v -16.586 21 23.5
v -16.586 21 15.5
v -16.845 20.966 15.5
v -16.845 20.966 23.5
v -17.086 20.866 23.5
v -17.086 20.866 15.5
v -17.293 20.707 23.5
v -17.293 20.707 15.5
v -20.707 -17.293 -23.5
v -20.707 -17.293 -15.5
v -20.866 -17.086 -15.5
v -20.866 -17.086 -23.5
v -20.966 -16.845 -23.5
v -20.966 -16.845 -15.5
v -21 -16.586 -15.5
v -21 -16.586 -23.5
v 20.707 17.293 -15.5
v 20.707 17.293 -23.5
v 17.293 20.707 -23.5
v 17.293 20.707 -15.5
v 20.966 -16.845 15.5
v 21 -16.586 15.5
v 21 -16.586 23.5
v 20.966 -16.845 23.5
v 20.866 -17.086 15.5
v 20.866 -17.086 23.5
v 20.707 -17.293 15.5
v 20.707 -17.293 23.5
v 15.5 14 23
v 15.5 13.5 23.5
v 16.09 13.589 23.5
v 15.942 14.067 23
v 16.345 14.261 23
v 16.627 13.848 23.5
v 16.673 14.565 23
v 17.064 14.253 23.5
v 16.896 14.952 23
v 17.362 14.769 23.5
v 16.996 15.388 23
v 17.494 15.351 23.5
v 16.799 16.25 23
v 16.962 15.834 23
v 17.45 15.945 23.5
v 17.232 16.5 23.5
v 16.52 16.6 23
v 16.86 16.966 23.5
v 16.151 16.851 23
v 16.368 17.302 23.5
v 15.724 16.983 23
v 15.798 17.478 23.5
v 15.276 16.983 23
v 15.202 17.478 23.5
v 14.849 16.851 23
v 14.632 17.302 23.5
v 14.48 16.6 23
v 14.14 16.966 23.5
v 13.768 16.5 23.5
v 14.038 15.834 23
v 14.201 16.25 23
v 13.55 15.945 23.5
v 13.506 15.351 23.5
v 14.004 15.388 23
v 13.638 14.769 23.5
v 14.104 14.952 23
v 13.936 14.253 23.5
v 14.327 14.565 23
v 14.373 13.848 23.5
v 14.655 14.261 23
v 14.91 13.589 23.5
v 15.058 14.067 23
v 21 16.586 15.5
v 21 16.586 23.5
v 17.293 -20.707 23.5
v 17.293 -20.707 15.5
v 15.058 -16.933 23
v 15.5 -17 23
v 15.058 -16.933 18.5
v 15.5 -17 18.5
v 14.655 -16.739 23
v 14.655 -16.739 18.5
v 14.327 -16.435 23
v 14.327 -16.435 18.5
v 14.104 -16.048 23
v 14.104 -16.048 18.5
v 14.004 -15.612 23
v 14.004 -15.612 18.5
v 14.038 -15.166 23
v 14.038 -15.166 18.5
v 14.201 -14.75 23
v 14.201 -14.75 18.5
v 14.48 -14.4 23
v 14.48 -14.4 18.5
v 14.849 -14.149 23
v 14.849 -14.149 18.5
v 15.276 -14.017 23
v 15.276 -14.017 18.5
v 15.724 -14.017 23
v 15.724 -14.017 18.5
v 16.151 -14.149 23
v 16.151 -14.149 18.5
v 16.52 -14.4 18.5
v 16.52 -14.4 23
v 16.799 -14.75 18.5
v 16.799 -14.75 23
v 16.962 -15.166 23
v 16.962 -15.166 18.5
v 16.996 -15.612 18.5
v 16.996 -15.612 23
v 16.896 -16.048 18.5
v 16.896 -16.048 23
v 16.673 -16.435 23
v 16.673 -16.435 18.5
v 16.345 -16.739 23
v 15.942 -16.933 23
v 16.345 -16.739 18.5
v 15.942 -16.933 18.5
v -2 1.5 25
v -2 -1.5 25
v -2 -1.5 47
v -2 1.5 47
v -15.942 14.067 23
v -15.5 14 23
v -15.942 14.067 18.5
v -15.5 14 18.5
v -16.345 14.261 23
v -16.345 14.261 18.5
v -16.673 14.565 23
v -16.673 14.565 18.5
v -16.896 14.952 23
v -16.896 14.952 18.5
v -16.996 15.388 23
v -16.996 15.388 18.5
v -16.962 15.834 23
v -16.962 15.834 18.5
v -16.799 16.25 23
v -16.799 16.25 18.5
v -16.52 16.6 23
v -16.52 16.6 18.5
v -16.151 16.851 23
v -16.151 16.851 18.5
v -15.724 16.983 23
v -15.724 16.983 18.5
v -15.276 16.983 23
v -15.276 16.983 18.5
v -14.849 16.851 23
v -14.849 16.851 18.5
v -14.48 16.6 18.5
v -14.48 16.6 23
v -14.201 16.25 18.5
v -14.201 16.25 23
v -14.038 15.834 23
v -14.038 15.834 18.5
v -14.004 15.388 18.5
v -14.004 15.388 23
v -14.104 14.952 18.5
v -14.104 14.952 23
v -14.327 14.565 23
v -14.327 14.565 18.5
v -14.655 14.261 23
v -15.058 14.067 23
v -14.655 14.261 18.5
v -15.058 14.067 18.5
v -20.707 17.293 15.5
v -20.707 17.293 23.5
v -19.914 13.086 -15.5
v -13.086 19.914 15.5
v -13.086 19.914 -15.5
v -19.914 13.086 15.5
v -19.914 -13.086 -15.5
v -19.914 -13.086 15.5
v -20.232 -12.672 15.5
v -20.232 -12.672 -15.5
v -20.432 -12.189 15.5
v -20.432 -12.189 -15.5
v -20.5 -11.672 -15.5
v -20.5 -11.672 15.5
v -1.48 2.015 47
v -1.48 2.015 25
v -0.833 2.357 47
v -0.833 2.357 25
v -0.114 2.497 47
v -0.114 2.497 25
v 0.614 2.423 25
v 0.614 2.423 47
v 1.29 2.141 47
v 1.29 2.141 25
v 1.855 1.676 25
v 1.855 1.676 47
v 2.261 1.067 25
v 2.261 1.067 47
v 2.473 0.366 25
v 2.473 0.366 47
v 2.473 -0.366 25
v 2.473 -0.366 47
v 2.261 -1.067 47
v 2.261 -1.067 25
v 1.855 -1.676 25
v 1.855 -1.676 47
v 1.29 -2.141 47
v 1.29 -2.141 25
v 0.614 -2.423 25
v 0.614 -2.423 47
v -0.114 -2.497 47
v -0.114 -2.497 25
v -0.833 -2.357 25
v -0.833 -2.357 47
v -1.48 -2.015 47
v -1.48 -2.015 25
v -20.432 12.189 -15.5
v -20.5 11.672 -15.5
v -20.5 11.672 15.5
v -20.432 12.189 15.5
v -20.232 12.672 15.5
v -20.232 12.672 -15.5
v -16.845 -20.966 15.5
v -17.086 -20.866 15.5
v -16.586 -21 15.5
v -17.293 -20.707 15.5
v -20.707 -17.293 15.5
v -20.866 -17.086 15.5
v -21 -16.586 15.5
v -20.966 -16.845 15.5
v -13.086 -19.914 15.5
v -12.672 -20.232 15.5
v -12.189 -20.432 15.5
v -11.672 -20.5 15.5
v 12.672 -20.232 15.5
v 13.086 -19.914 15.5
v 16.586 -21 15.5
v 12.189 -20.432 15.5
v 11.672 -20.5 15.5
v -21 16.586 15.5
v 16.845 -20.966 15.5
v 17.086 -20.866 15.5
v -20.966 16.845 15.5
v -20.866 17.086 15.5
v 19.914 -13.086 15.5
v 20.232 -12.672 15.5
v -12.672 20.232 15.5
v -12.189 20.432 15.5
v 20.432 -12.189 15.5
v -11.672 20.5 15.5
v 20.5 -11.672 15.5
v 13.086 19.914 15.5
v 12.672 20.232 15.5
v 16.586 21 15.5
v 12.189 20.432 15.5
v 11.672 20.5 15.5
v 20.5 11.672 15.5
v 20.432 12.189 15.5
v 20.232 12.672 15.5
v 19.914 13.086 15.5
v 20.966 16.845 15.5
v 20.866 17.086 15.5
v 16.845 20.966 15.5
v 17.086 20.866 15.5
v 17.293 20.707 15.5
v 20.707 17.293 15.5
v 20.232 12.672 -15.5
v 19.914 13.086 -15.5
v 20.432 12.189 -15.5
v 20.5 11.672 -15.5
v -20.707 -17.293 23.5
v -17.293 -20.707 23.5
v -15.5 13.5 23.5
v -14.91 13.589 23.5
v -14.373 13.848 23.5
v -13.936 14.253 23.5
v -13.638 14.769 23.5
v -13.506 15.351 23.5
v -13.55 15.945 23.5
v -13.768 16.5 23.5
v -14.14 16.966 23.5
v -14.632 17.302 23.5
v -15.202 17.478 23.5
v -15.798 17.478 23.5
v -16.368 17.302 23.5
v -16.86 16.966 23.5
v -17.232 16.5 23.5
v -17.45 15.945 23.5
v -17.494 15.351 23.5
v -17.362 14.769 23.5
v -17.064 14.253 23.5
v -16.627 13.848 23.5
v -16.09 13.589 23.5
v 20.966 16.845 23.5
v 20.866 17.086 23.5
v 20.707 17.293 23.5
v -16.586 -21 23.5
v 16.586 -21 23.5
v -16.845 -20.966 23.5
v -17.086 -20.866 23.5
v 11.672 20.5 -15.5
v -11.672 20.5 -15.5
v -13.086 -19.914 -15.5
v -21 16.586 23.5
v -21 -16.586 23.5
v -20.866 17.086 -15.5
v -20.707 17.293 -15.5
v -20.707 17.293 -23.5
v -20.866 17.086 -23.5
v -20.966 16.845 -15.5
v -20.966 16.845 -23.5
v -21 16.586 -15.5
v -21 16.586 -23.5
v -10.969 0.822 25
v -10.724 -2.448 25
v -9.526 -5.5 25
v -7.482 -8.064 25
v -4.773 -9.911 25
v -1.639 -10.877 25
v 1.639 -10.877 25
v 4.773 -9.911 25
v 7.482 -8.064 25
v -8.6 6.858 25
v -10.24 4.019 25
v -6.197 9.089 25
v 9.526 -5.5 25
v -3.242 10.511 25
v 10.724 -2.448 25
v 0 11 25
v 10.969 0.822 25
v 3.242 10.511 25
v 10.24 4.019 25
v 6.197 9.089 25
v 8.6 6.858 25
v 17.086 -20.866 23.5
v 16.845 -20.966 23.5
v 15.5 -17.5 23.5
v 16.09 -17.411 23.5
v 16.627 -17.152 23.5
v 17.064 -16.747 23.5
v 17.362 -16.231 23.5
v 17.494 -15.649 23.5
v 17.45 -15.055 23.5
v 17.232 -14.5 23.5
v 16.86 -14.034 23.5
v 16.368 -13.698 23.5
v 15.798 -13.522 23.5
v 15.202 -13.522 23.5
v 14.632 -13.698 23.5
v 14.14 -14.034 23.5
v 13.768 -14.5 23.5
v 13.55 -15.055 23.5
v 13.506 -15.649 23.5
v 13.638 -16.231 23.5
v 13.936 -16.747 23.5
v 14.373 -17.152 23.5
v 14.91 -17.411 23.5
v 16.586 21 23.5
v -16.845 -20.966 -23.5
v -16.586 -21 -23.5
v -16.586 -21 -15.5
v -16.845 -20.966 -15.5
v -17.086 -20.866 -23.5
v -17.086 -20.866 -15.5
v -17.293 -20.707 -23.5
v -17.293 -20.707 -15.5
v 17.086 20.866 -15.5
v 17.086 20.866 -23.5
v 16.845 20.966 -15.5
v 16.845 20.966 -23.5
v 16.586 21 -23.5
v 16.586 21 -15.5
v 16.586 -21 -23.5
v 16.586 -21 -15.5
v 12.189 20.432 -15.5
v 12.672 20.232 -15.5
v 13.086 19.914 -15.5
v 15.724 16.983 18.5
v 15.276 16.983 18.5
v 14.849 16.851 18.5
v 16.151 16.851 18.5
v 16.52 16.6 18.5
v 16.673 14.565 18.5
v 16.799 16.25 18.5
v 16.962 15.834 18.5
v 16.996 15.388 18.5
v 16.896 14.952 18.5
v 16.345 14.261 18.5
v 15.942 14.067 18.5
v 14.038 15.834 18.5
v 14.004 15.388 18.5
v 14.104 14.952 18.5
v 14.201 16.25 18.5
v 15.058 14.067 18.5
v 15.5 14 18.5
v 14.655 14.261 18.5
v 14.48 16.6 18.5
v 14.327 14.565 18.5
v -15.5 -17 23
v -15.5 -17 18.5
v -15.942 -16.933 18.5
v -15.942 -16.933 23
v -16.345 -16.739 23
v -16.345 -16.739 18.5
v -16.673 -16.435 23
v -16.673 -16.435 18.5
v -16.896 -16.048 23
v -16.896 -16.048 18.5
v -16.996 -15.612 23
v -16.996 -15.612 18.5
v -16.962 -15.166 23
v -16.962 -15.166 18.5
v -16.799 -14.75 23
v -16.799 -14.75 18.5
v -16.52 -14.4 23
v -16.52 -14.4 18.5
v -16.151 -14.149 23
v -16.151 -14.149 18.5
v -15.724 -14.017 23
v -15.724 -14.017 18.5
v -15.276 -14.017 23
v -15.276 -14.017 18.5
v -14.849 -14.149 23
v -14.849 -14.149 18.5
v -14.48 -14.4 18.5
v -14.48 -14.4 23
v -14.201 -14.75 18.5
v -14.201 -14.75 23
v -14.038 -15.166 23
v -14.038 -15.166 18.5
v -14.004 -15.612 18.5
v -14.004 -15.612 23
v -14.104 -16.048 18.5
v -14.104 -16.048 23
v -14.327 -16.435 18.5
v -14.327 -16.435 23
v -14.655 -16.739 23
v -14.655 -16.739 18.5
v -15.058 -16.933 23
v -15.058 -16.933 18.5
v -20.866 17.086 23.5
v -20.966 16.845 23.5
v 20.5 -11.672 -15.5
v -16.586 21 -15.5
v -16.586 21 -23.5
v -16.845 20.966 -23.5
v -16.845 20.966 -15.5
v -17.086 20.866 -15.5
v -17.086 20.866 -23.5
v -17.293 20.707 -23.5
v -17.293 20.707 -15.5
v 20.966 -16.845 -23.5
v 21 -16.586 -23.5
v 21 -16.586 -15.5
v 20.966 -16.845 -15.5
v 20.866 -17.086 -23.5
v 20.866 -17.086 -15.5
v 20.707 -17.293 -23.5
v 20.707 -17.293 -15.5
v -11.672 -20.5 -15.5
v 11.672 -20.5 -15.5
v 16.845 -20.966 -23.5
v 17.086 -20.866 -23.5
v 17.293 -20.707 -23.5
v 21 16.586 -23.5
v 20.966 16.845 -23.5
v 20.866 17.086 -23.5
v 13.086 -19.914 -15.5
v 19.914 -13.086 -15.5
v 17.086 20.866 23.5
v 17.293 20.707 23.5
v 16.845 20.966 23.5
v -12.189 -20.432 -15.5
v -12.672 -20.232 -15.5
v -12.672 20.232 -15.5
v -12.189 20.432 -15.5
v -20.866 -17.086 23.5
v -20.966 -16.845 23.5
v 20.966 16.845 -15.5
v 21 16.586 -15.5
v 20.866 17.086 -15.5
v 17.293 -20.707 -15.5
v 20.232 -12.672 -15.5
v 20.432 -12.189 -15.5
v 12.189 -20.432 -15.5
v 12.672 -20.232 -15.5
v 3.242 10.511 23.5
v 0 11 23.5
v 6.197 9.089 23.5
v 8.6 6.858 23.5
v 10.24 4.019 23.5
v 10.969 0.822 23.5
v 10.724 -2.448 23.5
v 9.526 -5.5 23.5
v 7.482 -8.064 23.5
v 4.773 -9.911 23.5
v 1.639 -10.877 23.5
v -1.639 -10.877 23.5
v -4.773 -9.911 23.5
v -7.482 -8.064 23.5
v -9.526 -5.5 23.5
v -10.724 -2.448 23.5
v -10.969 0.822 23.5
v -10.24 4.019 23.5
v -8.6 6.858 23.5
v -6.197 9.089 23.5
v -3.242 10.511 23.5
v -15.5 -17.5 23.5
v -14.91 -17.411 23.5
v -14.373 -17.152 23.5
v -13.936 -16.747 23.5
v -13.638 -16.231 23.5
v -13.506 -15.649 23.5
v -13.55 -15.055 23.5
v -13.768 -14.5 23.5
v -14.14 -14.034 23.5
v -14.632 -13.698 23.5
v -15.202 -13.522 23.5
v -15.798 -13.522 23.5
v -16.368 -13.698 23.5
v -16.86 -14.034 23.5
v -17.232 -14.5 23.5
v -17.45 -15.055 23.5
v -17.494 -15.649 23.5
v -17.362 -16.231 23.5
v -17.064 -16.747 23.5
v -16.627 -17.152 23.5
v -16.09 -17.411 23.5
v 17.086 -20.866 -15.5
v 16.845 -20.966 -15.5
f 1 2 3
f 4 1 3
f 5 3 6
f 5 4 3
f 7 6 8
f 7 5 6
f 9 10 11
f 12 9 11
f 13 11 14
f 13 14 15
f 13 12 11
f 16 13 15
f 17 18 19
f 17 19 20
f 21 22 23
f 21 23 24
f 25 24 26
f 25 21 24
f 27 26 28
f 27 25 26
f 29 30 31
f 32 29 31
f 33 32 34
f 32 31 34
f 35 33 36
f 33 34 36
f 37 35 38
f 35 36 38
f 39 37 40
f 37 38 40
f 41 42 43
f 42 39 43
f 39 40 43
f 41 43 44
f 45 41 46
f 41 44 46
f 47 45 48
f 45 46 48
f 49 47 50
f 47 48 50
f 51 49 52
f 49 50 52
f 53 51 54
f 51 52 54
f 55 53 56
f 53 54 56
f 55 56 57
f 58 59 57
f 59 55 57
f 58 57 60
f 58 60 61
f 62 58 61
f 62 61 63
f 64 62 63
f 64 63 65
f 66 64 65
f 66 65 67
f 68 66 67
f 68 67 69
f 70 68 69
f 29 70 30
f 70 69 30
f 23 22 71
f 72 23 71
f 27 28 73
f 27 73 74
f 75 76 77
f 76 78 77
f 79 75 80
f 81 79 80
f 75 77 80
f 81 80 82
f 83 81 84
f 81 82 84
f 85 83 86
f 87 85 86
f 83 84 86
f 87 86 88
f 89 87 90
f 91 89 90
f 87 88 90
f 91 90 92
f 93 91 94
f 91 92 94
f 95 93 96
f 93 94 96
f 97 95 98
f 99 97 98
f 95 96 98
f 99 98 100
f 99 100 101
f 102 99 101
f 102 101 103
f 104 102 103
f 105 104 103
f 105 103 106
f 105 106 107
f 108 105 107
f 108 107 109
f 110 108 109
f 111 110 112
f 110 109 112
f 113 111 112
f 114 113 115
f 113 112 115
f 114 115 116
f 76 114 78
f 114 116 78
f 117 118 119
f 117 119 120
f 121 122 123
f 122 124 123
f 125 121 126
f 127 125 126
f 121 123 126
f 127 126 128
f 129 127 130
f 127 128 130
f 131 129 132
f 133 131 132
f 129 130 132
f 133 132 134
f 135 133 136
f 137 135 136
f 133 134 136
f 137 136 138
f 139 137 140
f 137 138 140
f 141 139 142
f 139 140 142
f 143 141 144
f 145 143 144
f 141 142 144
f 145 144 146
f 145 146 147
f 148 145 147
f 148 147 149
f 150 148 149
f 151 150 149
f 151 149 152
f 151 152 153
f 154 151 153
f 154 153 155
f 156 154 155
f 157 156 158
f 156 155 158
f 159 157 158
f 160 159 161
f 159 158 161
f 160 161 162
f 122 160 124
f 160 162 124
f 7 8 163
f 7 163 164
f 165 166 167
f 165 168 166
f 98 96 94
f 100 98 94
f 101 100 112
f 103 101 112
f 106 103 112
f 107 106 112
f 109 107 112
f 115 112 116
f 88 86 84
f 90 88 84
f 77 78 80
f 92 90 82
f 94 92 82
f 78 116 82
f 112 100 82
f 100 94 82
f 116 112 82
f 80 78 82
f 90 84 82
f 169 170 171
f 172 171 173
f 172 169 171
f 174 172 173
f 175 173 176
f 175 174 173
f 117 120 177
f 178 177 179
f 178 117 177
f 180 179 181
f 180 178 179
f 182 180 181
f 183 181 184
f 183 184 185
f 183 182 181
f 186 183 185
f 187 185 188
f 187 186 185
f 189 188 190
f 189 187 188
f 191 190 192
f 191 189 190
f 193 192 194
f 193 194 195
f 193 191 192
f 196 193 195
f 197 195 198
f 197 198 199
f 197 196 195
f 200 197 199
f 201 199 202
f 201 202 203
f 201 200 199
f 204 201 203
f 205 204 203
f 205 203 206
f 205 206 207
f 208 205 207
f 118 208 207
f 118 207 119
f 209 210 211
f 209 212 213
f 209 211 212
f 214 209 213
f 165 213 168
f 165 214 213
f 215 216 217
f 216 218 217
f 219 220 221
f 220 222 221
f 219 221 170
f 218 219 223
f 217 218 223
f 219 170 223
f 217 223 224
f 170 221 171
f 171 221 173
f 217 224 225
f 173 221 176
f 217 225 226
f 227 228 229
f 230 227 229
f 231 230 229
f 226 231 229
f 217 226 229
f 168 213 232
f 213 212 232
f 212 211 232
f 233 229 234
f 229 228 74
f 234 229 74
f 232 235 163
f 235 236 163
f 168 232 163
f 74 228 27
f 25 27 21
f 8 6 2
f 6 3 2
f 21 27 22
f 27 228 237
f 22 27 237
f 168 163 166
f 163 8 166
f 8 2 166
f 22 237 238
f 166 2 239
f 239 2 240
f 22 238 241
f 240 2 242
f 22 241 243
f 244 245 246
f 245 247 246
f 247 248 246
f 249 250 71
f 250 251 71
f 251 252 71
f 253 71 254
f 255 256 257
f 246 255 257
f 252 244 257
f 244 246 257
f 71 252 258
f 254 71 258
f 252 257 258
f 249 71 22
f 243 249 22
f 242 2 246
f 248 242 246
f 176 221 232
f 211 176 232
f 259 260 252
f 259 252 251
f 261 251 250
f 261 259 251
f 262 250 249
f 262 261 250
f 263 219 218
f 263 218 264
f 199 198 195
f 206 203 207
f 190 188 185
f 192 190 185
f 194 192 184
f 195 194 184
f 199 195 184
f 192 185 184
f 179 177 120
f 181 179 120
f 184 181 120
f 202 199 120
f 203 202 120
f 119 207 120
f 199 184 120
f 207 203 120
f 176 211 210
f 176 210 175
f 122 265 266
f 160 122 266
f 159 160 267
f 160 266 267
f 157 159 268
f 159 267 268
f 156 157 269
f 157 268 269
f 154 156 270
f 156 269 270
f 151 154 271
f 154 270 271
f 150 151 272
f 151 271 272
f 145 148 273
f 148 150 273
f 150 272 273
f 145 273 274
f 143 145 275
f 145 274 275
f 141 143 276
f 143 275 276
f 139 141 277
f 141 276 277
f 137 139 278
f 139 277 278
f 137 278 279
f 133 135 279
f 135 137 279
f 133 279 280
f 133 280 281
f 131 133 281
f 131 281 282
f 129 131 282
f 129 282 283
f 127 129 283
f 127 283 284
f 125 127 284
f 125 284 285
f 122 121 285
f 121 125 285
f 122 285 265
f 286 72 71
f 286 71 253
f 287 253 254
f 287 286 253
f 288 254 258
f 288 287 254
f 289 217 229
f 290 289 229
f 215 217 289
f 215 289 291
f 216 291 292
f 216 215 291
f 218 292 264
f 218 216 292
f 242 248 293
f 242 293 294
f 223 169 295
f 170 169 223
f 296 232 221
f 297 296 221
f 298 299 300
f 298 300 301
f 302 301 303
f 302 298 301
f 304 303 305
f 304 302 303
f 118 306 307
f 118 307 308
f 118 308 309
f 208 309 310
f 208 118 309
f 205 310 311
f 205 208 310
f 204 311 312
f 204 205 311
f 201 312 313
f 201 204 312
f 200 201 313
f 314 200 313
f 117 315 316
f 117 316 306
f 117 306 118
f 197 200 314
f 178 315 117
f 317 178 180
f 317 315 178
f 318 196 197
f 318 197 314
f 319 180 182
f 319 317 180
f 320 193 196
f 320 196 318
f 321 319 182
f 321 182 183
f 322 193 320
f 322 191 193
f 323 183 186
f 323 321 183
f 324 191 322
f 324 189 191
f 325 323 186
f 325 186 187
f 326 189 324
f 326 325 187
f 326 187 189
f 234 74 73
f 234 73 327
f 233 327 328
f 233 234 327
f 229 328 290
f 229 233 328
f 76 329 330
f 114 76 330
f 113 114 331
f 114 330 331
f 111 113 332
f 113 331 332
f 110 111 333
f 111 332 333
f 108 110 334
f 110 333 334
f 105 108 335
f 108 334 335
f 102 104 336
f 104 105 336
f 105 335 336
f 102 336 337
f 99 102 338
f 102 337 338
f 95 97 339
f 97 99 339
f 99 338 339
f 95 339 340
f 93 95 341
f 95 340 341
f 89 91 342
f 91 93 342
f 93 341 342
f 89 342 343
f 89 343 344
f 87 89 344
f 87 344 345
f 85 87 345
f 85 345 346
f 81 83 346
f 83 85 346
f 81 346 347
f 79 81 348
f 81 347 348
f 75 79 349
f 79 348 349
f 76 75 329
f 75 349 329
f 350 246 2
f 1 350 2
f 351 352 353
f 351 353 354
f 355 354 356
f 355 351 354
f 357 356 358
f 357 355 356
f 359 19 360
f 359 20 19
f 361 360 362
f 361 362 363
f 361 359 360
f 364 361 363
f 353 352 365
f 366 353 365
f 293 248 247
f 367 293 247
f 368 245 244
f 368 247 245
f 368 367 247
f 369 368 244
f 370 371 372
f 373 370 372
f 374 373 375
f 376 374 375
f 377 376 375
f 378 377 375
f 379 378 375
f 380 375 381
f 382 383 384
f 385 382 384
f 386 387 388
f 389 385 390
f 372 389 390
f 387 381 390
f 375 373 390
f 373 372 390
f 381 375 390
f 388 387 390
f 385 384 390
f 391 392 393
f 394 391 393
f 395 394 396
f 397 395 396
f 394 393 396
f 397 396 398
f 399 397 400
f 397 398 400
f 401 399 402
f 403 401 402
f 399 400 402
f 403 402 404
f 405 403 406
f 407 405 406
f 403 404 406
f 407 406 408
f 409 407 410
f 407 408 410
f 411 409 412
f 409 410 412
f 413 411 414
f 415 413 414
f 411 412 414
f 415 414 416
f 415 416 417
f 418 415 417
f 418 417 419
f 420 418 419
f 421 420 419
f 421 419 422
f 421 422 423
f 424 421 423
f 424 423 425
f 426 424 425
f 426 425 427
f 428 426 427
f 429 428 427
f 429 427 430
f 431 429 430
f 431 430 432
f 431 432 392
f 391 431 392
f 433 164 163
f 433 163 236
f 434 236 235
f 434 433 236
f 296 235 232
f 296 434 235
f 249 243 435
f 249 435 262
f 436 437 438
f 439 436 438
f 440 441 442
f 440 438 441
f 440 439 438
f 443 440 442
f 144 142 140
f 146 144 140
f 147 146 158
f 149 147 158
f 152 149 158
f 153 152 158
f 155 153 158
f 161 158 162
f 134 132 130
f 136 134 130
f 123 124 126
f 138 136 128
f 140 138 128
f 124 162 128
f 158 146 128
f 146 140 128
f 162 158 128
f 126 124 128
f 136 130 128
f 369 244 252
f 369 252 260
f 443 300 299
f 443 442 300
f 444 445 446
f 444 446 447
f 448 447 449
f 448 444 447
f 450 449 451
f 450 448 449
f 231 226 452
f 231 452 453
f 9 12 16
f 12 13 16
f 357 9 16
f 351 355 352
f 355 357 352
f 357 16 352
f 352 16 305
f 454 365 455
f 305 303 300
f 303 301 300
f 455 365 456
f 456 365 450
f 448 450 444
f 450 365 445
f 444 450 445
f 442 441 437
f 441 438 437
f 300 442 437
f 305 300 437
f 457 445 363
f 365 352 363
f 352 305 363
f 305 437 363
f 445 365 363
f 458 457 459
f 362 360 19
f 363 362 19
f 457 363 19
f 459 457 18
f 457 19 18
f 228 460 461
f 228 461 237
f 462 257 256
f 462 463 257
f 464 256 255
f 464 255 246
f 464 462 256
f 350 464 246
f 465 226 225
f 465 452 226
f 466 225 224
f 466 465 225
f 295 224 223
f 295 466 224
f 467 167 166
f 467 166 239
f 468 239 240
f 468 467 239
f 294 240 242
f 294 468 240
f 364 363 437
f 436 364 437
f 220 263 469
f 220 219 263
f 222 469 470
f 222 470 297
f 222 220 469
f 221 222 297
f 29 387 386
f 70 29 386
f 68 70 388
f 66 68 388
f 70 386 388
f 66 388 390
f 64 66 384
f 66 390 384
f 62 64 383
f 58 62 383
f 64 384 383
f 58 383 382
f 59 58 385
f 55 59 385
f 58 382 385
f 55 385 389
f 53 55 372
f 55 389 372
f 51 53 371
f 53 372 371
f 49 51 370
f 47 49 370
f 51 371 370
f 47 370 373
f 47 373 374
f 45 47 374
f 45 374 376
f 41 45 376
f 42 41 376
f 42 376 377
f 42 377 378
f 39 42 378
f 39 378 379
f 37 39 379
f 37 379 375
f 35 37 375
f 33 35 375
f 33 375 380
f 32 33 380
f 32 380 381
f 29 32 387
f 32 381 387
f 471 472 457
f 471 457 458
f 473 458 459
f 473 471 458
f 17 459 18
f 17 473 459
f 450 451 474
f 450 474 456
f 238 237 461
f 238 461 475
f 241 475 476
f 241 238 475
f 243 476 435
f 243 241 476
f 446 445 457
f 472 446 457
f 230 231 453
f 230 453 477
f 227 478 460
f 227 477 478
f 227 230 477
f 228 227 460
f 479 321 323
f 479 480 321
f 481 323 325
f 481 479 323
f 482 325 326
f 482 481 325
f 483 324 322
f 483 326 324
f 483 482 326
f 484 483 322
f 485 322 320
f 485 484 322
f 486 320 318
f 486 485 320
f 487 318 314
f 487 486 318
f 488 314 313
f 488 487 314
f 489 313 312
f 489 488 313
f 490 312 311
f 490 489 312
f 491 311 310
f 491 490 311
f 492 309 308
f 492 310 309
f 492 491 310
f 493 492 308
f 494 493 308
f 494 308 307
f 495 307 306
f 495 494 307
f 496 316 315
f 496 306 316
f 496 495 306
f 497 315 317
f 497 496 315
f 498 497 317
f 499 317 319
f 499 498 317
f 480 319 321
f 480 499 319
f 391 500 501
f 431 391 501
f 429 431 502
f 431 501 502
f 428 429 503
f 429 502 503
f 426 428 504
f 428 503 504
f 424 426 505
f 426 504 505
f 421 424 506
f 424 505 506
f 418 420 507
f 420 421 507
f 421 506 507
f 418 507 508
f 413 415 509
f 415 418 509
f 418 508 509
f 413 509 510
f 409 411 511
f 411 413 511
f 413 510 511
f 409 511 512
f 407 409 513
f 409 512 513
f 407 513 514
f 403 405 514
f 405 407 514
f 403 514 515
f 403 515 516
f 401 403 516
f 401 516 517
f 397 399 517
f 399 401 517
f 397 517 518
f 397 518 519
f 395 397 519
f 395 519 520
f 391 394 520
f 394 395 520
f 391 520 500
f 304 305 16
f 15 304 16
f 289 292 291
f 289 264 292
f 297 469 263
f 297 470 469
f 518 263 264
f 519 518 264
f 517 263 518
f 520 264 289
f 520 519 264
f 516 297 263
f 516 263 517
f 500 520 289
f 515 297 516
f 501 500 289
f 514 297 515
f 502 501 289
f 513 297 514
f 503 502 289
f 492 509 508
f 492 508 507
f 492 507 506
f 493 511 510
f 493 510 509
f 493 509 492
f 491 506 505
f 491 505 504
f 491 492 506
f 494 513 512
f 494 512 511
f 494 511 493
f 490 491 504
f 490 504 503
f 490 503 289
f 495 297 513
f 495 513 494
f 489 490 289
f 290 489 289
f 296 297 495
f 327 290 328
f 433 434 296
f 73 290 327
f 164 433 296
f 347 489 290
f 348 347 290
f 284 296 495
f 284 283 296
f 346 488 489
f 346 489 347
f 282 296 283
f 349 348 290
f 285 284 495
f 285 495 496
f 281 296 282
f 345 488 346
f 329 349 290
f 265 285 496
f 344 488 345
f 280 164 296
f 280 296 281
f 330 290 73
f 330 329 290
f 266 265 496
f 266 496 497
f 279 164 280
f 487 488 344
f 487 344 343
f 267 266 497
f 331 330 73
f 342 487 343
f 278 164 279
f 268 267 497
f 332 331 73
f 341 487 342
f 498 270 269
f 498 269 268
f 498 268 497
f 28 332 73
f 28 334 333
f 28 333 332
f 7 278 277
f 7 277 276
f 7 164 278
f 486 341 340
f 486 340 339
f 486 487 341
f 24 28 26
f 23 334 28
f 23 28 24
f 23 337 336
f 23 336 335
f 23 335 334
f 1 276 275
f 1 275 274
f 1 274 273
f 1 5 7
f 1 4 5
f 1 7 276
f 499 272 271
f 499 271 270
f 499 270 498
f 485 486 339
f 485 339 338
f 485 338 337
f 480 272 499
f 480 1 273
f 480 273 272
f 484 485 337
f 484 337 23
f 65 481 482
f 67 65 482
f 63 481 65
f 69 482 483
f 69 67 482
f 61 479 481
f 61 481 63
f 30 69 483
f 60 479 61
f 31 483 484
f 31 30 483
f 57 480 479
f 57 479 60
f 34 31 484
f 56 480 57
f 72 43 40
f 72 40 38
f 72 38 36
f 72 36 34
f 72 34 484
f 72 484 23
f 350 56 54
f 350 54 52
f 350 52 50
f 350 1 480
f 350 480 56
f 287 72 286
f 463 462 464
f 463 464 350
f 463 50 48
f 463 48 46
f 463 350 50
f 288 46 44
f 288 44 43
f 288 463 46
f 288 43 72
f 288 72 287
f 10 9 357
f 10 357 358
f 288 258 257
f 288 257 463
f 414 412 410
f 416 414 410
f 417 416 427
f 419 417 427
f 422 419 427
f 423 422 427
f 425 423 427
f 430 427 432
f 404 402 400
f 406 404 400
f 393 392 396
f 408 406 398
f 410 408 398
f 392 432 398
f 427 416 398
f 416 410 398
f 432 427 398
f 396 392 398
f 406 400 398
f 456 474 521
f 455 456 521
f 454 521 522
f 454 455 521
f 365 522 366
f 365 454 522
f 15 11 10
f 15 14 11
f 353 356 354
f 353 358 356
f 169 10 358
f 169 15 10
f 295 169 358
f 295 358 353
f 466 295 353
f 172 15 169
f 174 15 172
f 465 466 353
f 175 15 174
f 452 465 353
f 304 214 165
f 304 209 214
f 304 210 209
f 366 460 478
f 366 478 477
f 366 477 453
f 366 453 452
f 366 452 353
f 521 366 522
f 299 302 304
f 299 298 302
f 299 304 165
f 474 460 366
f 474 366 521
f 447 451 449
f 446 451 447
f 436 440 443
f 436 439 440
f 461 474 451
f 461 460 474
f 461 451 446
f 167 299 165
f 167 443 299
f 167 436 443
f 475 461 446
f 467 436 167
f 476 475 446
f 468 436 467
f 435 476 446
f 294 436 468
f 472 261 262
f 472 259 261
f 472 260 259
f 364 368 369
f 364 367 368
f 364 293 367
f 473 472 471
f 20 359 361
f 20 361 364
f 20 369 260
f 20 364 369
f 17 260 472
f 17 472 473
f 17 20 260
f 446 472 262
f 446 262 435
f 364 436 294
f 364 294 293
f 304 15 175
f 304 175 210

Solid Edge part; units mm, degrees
sketch "Sketch1" plane through (0, 0, 0) normal (0, 0, 1) x (1, 0, 0)
  line L0 (21, -21) -> (21, 21)
  line L1 (21, 21) -> (-21, 21)
  line L2 (-21, 21) -> (-21, -21)
  line L3 (-21, -21) -> (21, -21)
extrude "Protrusion1" add sketch "Sketch1" along normal mid plane 47
sketch "Sketch2" plane through (0, 0, 0) normal (0, 0, 1) x (1, 0, 0)
  line L0 (20.5, -20.5) -> (20.5, 20.5)
  line L1 (20.5, 20.5) -> (-20.5, 20.5)
  line L2 (-20.5, 20.5) -> (-20.5, -20.5)
  line L3 (-20.5, -20.5) -> (20.5, -20.5)
extrude "VaciadoExtruido_1" cut sketch "Sketch2" along normal mid plane 31 flip side to cut
chamfer "Chaflán_1" distance 8 angle 45 4 edges at (20.5, -20.5, 0) (20.5, 20.5, 0) (-20.5, -20.5, 0) (-20.5, 20.5, 0)
chamfer "Chaflán_2" distance 4 angle 45 8 edges at (21, -21, 19.5) (21, 21, 19.5) (21, 21, -19.5) (21, -21, -19.5) (-21, -21, -19.5) (-21, -21, 19.5) (-21, 21, 19.5) (-21, 21, -19.5)
fillet "Redondeo_1" radius 2 8 edges at (-20.5, 12.5, 0) (-12.5, 20.5, 0) (12.5, 20.5, 0) (20.5, 12.5, 0) (20.5, -12.5, 0) (12.5, -20.5, 0) (-12.5, -20.5, 0) (-20.5, -12.5, 0)
fillet "Redondeo_2" radius 1 16 edges at (-21, -17, 19.5) (-17, -21, 19.5) (-21, 17, 19.5) (-17, 21, 19.5) (17, -21, 19.5) (21, -17, 19.5) (21, 17, 19.5) (17, 21, 19.5) (21, 17, -19.5) (21, -17, -19.5) (17, -21, -19.5) (-17, -21, -19.5) (-21, -17, -19.5) (-21, 17, -19.5) (-17, 21, -19.5) (17, 21, -19.5)
sketch "Sketch3" plane through (0, 0, 23.5) normal (0, 0, 1) x (0, 1, 0)
  circle A0 centre (0, 0) radius 11
extrude "ProtrusiónExtruida_3" add sketch "Sketch3" along normal blind 1.5
sketch "Sketch4" plane through (0, 0, 25) normal (0, 0, 1) x (0, 1, 0)
  line L0 (-1.5, 2) -> (1.5, 2)
  arc A0 (1.5, 2) -> (-1.5, 2) centre (0, 0) cw
extrude "ProtrusiónExtruida_4" add sketch "Sketch4" along normal blind 22
hole "Agujero_1" at (-15.5, -15.5, 23.5) direction (0, 0, -1) diameter 3 depth 5
hole "Hole1" at (15.5, -15.5, 23.5) direction (0, 0, -1) diameter 3 depth 5
hole "Hole2" at (15.5, 15.5, 23.5) direction (0, 0, -1) diameter 3 depth 5
hole "Hole3" at (-15.5, 15.5, 23.5) direction (0, 0, -1) diameter 3 depth 5
chamfer "Chaflán_3" distance 0.5 angle 45 4 edges at (-15.5, -14, 23.5) (-15.5, 17, 23.5) (15.5, 17, 23.5) (15.5, -14, 23.5)
